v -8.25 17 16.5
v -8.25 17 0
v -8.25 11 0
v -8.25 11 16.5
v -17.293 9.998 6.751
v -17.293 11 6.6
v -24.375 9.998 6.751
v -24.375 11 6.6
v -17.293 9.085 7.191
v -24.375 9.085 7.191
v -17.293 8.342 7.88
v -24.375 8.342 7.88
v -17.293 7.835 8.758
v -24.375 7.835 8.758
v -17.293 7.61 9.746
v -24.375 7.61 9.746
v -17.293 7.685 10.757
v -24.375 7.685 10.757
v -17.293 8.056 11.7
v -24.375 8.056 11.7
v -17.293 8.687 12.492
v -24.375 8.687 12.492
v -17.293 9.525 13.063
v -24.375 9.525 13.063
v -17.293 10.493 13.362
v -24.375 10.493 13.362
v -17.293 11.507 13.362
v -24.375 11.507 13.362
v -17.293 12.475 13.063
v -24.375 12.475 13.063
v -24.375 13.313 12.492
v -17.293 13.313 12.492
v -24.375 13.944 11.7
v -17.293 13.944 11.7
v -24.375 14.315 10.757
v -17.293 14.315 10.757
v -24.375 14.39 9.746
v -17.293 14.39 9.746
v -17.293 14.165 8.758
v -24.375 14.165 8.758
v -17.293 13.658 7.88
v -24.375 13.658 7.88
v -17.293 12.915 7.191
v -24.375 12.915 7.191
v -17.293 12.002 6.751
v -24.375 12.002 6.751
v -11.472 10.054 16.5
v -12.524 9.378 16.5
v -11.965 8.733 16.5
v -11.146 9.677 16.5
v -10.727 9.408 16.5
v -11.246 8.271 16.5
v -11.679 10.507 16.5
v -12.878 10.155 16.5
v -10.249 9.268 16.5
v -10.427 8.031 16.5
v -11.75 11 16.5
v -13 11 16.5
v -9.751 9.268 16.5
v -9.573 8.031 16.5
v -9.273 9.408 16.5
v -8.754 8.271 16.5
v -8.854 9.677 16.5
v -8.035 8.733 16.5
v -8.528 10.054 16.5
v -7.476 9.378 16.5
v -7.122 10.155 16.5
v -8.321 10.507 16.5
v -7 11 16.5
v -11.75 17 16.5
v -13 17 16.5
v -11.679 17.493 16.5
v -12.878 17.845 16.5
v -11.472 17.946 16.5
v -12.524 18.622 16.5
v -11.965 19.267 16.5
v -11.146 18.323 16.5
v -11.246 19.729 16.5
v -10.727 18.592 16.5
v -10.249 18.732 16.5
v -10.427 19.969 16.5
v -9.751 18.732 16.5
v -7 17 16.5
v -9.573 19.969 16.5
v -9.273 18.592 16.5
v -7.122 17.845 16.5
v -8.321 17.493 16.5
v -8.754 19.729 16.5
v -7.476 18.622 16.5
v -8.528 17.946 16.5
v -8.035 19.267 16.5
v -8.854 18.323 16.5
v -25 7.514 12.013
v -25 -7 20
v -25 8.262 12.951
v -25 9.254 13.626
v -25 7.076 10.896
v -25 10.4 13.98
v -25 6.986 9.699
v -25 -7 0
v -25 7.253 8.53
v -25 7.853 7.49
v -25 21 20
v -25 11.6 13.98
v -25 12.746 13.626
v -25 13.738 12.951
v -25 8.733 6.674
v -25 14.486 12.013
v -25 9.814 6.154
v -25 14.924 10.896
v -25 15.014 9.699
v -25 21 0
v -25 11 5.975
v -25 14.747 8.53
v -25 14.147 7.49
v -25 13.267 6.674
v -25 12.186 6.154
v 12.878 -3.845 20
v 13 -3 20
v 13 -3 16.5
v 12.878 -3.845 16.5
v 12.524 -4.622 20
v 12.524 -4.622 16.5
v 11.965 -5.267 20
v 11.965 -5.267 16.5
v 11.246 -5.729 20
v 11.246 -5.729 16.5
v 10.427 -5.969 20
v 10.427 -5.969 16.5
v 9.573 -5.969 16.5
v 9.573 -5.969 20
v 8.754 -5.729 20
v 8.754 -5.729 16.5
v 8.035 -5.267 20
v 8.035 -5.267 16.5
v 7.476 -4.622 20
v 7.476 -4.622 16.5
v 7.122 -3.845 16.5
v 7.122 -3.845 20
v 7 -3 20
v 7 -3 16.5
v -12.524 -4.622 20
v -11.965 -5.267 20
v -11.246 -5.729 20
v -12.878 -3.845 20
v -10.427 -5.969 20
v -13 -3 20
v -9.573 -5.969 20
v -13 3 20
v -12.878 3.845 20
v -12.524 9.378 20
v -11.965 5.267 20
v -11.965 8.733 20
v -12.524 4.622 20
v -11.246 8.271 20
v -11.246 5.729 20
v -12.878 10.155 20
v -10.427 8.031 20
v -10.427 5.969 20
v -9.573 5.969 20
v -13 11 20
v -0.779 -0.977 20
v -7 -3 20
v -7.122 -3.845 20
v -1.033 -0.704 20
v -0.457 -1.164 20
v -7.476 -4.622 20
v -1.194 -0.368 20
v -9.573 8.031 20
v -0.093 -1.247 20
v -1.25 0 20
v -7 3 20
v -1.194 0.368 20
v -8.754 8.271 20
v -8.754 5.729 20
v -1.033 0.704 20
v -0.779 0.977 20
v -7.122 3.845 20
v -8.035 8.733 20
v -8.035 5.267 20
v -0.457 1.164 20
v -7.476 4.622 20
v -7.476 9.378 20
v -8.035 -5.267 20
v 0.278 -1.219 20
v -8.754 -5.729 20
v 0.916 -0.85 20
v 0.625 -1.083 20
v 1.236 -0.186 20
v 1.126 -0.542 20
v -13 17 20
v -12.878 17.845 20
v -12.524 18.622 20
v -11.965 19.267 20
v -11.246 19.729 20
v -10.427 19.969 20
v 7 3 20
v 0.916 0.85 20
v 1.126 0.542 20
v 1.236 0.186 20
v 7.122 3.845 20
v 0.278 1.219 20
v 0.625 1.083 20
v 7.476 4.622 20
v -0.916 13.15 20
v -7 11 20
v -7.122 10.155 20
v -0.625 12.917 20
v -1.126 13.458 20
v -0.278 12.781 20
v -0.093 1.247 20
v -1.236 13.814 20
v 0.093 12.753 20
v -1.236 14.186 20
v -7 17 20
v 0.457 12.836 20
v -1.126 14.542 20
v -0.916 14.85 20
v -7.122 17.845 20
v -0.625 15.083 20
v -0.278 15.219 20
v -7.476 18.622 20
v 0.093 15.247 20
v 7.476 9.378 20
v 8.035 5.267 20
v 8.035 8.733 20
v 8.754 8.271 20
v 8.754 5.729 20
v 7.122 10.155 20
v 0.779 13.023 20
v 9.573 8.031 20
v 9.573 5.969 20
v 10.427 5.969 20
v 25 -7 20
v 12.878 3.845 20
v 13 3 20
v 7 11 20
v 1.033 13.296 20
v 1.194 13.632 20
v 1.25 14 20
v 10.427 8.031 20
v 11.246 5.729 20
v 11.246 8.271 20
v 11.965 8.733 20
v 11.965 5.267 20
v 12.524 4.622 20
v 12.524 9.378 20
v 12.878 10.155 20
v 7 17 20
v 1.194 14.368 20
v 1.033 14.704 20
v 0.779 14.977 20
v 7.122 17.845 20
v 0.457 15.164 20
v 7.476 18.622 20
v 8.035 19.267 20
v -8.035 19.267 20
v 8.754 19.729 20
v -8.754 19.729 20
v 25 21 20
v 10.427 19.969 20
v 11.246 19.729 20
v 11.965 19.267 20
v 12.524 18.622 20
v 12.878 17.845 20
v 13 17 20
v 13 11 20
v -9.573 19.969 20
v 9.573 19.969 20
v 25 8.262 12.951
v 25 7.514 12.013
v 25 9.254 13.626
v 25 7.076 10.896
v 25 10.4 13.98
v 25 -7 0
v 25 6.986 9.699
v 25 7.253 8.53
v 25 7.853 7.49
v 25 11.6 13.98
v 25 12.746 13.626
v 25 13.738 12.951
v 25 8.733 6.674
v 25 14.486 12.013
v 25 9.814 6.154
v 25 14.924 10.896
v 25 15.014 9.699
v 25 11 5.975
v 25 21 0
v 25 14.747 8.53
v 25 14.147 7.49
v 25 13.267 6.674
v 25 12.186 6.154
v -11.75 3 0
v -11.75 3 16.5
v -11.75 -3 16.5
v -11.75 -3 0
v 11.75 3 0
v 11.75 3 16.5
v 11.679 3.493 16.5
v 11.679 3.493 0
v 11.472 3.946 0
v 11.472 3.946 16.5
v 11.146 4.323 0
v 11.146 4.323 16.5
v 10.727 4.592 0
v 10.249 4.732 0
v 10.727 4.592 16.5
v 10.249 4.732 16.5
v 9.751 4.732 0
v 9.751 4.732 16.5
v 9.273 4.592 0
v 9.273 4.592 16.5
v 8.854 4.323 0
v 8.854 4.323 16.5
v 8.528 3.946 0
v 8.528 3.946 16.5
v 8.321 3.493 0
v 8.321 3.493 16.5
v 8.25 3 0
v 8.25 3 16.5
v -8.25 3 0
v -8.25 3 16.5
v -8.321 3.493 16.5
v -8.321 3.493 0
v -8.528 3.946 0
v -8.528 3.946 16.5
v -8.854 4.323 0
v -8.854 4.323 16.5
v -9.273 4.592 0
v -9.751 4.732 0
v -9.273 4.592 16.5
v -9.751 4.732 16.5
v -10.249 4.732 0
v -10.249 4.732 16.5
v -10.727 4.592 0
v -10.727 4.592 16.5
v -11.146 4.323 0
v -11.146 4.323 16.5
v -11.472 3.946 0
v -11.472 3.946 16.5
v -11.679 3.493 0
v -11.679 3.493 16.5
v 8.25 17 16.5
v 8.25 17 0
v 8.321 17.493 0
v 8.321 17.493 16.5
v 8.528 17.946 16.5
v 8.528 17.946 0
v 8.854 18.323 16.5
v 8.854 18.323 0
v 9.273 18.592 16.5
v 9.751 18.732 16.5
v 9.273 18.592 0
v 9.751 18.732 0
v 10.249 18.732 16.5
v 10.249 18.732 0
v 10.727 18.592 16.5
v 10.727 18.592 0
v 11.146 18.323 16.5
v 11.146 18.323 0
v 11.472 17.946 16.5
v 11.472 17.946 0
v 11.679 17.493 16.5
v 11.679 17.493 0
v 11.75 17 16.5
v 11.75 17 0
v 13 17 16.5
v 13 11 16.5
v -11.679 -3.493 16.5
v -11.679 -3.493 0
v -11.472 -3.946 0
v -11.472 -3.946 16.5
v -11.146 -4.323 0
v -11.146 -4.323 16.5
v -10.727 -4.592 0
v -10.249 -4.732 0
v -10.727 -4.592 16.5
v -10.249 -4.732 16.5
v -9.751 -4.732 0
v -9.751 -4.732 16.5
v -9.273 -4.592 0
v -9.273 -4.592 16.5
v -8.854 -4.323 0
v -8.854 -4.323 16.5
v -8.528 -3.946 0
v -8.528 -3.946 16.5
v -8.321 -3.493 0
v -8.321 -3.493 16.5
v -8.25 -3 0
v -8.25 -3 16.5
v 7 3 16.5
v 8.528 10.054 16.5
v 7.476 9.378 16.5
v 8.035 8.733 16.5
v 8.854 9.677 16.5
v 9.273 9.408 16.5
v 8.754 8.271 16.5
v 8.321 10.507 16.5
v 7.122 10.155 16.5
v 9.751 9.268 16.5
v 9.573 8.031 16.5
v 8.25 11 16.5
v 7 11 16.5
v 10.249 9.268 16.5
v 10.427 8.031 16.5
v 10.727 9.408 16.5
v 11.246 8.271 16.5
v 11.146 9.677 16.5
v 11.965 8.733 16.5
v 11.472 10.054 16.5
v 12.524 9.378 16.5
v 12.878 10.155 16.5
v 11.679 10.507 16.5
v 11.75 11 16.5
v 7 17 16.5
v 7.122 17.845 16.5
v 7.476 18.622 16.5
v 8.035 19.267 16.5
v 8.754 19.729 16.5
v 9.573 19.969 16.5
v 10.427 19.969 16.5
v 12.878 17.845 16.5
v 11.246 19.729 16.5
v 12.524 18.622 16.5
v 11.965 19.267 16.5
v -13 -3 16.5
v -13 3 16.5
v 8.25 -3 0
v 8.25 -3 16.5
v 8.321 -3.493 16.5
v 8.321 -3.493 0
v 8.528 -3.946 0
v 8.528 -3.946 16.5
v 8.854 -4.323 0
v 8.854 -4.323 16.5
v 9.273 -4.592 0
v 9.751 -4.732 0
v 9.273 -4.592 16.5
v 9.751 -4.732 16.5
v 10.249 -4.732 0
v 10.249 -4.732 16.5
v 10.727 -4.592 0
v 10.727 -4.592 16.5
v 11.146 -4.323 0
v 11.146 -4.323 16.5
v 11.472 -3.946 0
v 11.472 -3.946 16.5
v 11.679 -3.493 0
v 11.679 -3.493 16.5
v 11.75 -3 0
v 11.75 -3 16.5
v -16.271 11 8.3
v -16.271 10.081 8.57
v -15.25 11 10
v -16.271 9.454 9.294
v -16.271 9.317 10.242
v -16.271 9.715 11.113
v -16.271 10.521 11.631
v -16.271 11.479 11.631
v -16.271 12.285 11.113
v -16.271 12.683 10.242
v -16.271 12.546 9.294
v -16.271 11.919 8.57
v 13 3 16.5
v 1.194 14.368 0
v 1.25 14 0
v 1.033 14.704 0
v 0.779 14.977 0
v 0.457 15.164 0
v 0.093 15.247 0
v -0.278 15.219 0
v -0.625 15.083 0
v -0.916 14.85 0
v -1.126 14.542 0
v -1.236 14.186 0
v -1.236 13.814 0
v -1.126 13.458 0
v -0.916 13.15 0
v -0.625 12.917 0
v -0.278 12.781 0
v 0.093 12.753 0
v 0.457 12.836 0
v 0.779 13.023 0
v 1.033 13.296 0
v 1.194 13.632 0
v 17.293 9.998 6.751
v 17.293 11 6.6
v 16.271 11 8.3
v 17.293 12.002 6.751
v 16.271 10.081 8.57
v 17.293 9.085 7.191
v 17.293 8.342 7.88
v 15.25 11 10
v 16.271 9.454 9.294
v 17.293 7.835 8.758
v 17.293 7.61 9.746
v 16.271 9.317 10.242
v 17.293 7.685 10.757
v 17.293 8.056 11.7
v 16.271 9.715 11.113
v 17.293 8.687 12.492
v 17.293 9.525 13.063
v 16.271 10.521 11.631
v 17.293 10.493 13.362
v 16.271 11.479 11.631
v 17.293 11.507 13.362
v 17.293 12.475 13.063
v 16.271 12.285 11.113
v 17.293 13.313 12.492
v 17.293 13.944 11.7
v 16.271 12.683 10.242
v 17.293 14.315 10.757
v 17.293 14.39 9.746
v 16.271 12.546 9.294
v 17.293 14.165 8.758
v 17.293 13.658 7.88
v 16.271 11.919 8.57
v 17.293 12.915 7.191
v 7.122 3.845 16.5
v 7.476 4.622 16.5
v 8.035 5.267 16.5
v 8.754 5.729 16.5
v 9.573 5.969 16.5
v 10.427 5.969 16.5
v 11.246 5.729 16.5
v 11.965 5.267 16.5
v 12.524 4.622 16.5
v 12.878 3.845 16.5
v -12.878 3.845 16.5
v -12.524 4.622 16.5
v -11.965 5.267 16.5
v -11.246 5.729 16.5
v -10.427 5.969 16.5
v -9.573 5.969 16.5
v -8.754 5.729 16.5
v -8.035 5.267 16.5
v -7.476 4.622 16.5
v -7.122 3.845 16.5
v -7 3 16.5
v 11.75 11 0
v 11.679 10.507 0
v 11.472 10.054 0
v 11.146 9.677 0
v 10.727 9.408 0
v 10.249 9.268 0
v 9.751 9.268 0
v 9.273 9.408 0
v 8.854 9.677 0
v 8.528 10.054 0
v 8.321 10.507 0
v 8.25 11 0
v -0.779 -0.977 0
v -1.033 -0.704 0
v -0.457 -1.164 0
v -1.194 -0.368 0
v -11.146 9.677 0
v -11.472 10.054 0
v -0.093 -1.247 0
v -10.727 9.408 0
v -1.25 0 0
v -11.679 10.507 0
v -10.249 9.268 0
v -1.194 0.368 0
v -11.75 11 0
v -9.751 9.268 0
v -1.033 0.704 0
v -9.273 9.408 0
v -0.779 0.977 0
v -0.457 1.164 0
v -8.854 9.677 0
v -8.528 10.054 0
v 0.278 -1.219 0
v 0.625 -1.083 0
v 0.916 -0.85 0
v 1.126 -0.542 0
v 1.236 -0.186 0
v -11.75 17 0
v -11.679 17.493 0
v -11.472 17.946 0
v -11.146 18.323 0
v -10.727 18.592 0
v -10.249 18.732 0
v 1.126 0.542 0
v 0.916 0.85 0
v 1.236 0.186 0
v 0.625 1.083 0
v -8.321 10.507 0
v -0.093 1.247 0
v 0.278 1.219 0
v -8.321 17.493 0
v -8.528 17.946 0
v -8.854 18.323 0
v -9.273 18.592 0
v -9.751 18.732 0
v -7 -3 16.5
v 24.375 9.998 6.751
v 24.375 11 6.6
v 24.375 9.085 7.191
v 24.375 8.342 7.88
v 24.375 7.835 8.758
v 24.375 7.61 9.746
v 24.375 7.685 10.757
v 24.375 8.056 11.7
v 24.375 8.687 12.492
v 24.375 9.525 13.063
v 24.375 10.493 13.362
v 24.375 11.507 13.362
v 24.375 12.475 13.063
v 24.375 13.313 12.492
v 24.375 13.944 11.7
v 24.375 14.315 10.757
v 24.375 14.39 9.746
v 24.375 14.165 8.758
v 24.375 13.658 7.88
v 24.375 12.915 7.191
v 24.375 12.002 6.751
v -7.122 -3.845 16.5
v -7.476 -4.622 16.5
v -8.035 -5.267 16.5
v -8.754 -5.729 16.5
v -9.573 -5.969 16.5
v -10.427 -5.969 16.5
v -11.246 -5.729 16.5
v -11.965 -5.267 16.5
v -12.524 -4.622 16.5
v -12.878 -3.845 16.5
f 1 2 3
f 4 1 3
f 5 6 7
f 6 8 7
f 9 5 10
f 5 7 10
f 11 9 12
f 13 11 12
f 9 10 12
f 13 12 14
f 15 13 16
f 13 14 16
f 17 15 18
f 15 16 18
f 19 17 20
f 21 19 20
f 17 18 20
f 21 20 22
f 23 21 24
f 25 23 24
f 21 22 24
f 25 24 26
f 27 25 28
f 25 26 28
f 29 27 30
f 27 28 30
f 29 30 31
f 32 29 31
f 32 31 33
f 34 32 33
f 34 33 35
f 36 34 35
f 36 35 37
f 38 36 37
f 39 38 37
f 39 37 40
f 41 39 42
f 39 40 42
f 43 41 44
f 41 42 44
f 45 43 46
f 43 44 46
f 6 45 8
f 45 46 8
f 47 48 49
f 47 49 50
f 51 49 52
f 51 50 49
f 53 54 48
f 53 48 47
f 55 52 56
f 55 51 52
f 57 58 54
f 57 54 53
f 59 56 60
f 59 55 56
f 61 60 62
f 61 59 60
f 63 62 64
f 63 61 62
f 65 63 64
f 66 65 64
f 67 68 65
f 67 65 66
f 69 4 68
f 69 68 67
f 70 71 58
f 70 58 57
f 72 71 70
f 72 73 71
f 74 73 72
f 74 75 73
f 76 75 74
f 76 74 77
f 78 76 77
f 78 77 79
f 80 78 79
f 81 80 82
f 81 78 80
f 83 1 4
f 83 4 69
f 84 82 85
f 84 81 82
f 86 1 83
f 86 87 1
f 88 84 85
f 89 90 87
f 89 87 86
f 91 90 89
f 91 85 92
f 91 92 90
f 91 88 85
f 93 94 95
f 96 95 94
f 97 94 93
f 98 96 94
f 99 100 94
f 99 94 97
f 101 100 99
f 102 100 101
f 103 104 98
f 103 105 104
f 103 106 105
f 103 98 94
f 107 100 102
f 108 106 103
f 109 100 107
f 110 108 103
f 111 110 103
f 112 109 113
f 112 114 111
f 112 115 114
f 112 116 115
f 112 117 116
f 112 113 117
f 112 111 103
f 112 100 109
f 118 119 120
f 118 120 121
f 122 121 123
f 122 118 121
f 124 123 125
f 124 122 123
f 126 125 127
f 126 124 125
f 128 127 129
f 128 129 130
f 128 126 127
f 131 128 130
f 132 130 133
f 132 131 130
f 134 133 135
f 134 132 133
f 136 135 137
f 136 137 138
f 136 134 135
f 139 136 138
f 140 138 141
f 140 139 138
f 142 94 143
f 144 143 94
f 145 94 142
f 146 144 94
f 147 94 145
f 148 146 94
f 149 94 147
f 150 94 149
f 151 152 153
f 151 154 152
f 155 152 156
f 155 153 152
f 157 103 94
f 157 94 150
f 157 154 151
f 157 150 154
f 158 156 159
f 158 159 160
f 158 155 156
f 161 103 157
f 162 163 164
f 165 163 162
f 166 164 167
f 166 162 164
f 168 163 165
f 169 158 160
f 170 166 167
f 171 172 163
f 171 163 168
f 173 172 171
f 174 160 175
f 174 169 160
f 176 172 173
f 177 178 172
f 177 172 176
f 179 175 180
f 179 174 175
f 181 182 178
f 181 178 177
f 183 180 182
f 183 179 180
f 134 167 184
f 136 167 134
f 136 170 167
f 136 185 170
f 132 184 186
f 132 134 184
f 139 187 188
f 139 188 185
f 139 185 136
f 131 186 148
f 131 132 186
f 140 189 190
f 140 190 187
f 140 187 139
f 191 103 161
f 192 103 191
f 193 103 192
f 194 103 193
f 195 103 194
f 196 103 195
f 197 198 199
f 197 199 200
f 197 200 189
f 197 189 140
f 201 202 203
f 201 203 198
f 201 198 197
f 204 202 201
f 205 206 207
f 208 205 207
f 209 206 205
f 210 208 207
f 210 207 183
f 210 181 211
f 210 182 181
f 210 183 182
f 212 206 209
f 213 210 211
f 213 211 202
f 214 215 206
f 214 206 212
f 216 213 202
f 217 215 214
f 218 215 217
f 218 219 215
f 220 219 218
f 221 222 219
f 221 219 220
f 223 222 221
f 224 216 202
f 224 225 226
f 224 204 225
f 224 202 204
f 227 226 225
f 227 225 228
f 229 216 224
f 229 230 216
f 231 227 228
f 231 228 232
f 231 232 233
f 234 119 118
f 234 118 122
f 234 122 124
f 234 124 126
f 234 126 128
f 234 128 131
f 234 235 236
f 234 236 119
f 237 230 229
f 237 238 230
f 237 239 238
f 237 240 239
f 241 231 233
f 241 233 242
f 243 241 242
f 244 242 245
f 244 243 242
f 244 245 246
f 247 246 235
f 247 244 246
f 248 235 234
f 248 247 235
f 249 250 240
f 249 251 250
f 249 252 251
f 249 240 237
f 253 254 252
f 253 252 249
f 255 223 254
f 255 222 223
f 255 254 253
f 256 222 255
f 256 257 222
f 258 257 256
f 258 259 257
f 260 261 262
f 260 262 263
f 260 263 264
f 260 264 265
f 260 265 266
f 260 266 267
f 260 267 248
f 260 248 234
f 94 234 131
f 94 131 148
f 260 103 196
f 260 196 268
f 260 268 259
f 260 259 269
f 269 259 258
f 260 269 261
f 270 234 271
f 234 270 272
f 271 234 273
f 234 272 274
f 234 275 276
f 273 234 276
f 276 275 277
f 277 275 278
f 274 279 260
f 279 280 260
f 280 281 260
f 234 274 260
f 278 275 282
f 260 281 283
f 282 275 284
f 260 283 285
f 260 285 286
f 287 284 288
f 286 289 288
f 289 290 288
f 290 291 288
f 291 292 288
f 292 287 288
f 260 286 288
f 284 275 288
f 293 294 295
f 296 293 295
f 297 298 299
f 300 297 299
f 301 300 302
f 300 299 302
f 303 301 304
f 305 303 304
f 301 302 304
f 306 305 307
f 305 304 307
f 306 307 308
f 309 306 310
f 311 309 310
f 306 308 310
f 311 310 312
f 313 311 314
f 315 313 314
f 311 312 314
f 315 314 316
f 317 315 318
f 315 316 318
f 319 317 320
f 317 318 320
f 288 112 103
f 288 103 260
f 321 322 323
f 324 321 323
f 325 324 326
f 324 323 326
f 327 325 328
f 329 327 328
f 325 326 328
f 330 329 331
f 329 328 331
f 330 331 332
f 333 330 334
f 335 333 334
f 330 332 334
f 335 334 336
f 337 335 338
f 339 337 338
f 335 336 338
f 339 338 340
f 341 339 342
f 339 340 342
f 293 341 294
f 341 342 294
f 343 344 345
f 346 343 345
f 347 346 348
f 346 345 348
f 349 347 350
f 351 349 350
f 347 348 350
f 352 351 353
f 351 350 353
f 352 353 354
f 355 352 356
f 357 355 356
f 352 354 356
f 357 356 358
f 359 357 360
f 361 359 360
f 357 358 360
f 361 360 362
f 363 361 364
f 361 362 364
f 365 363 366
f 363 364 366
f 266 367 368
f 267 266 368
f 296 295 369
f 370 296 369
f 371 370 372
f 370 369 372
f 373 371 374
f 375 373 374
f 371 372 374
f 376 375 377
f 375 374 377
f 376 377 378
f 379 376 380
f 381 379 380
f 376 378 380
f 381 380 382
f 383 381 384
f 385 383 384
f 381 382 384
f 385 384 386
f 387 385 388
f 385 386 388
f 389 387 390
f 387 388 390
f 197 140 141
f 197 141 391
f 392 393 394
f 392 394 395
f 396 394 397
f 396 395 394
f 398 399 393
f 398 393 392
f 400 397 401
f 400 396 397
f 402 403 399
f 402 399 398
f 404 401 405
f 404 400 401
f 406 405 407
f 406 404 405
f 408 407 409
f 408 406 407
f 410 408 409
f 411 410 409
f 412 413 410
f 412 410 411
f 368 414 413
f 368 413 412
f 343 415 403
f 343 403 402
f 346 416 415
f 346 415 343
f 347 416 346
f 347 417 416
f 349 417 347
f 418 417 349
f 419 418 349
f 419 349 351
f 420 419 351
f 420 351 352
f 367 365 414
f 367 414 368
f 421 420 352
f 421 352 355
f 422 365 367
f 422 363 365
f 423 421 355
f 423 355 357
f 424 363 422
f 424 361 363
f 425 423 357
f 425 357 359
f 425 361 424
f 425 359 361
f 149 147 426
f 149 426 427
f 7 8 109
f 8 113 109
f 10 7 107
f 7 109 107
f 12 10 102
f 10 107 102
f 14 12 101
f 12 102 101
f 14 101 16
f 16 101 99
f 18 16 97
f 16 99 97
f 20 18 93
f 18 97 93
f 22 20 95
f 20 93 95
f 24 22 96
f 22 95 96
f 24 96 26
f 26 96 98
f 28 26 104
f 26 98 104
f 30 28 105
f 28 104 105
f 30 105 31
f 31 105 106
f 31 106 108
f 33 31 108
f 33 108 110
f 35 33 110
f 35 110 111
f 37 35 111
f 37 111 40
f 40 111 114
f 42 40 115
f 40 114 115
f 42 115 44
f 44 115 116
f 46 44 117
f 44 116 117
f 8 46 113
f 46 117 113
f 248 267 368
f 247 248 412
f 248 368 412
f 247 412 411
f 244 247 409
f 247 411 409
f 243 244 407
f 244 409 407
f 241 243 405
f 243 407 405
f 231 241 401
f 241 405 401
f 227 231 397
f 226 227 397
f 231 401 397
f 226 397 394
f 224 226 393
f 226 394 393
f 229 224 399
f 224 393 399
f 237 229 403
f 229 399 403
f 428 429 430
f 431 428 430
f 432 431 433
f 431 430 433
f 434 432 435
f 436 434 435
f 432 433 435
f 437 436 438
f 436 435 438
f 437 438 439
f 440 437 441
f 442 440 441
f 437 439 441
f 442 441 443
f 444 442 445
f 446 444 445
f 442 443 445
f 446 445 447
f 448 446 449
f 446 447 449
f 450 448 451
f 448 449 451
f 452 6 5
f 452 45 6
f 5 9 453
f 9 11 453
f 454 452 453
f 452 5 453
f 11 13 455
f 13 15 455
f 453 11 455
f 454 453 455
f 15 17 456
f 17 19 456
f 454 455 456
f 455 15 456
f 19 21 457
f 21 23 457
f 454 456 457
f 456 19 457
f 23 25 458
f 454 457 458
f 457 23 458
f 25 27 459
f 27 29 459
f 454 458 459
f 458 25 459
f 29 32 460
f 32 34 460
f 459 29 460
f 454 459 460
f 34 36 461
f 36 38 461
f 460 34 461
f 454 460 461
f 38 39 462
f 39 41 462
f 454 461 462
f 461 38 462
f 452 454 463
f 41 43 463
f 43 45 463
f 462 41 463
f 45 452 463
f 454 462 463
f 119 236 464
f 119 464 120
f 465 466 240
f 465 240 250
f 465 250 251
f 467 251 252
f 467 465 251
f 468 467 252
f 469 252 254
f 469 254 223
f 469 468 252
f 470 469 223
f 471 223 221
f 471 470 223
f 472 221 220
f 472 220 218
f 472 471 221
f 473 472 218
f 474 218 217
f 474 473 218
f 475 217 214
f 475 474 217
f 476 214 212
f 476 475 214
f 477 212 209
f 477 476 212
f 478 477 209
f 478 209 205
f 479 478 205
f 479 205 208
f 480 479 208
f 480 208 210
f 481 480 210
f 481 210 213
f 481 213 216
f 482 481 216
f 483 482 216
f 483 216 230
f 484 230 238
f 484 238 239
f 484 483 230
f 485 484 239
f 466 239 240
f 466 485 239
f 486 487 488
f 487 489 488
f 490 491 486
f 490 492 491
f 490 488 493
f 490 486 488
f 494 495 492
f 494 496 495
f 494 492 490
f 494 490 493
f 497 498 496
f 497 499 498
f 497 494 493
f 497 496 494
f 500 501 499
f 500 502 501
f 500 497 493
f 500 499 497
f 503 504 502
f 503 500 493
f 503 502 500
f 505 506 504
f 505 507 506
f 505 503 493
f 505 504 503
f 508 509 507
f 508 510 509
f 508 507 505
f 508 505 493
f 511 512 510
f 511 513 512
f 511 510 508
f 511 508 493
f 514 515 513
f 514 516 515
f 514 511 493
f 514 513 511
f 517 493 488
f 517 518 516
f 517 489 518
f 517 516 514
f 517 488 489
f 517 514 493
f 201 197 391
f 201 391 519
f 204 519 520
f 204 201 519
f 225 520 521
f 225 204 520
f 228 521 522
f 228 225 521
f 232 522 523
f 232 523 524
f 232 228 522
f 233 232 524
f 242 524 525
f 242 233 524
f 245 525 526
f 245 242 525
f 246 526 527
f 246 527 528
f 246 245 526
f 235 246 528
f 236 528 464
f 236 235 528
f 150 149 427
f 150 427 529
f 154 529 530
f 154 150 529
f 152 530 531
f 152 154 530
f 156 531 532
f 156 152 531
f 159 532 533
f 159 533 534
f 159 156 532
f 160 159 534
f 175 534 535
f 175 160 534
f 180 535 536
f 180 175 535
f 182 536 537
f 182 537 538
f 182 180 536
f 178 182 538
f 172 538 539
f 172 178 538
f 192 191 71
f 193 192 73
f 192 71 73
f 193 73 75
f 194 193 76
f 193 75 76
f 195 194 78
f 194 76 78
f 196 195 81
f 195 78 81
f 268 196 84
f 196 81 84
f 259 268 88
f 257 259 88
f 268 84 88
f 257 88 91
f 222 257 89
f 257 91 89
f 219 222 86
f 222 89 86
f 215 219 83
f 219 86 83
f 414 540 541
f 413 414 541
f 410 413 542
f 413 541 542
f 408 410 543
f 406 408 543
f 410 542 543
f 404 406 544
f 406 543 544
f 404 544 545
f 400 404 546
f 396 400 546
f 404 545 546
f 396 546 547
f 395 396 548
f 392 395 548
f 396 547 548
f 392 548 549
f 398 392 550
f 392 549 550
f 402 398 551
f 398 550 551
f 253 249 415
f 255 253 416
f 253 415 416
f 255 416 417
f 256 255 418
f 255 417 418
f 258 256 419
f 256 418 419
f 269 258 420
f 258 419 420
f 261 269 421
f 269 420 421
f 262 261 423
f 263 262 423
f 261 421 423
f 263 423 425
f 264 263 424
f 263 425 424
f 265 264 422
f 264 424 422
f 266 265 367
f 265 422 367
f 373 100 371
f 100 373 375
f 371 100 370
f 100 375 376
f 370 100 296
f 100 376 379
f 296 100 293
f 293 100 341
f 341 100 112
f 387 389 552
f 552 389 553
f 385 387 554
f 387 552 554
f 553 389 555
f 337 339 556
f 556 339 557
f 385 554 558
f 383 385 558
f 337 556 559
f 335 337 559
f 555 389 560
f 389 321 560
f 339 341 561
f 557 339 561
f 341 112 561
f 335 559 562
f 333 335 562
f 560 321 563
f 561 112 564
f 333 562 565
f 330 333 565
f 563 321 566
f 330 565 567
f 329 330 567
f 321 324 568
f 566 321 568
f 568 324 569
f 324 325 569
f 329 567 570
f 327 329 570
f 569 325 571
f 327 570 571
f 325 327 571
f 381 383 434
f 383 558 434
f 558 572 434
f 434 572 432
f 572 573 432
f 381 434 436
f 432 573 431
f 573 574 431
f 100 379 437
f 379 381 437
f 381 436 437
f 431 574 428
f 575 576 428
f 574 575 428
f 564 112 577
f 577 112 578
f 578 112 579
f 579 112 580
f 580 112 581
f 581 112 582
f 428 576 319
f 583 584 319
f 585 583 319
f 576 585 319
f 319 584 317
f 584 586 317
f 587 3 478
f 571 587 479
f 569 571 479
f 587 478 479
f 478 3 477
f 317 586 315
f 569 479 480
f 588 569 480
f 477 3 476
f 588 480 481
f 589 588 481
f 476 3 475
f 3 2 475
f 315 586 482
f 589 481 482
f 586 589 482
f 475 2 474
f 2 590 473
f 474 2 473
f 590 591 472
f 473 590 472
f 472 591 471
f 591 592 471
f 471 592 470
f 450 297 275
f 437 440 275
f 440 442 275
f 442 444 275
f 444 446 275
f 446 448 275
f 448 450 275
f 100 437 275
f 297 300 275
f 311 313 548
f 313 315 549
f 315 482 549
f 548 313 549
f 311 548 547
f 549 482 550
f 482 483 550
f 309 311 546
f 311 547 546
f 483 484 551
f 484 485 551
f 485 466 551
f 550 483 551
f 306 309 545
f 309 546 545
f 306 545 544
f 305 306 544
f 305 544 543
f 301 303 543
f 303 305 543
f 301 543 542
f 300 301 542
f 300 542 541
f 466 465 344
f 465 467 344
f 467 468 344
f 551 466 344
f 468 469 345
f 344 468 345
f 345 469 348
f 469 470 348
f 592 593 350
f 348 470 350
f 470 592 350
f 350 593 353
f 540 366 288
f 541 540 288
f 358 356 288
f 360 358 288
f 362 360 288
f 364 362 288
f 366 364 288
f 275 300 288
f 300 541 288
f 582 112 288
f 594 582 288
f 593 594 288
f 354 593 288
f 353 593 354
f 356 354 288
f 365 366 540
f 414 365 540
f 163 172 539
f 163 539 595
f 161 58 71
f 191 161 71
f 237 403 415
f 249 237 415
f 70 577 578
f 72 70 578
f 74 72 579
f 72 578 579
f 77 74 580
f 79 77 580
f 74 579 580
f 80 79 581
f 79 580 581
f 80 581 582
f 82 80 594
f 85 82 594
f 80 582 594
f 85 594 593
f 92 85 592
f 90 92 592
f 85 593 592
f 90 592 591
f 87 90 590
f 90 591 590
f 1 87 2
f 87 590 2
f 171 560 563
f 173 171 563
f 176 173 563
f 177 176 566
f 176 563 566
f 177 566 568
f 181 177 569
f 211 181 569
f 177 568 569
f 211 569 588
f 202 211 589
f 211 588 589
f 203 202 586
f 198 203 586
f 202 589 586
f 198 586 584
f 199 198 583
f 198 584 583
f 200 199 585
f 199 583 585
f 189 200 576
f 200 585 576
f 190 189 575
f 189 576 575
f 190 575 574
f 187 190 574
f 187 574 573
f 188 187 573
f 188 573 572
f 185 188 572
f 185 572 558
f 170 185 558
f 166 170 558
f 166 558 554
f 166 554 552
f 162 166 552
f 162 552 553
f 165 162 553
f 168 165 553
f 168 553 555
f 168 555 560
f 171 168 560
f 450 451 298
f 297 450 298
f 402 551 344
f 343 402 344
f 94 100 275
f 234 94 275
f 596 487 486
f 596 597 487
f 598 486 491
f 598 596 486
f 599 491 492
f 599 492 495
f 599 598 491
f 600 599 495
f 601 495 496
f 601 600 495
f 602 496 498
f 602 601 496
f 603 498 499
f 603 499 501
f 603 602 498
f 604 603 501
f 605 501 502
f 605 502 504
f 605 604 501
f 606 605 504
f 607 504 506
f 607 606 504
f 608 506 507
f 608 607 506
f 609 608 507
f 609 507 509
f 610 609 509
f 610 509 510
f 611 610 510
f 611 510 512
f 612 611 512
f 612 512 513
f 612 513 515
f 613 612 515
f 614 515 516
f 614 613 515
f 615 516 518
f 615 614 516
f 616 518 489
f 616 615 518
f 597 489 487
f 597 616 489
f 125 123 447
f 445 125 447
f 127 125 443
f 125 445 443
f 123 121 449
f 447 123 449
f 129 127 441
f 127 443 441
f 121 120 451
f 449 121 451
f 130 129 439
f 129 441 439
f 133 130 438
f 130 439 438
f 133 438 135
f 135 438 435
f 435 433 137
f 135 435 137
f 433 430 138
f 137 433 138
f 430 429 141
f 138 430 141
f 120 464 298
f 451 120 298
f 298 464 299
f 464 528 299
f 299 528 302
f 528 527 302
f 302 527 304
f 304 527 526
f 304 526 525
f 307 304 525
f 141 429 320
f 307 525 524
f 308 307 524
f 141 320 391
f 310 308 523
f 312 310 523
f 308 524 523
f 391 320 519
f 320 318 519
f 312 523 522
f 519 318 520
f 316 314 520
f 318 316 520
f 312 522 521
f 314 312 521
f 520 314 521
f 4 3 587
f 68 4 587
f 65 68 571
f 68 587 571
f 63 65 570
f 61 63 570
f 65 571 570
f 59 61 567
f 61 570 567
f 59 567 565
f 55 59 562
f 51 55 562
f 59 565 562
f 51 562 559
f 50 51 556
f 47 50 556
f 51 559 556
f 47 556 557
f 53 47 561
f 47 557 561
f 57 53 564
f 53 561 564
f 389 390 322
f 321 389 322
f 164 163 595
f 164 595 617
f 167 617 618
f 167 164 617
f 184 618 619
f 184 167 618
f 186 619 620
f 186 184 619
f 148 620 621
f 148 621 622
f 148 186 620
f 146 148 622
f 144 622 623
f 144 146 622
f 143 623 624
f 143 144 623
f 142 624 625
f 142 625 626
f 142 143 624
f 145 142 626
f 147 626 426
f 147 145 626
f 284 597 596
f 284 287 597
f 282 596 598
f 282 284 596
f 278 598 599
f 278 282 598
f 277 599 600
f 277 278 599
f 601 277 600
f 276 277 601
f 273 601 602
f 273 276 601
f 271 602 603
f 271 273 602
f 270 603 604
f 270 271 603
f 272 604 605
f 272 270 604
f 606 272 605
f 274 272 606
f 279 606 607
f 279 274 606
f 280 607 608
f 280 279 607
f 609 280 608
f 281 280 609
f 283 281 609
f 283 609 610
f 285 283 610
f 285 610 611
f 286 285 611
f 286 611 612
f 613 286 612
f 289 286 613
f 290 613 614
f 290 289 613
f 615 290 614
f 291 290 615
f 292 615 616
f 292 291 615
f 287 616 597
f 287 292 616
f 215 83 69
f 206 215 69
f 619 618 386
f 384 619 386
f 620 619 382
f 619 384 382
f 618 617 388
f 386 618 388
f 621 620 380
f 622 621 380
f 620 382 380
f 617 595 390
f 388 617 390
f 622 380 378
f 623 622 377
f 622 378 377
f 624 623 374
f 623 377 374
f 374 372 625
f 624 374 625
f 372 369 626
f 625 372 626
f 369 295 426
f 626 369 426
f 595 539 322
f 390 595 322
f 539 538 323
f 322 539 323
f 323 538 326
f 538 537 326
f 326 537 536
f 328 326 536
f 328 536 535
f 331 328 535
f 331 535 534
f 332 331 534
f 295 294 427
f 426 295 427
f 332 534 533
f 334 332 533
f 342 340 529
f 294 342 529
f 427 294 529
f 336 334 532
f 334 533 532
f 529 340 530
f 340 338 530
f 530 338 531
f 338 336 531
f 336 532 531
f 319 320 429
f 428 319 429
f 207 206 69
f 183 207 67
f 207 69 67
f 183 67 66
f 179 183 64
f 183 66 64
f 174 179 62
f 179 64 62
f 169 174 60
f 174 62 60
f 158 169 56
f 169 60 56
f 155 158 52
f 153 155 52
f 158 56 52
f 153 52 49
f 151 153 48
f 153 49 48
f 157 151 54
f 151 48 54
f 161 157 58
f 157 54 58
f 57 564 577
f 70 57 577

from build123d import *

# Parameters (mm, degrees)
SKETCH1_W             = 50
SKETCH1_H             = 14
BOSS_EXTRUDE1_DEPTH   = 20
CUT_EXTRUDE1_DEPTH    = 3.5
CUT_EXTRUDE2_DEPTH    = 31.761176831
M3X0_5_TAPPED_HOLE1_D = 2.5
MIRROR1_OUTLINE_W     = 50
MIRROR1_OUTLINE_H     = 14
MIRROR1_OUTLINE_R     = 1.25
MIRROR1_DEPTH         = 20
MIRROR1_2_DEPTH       = 16.5


# Read off the part's stored shape, not the designer's step: Mirror1
with BuildPart() as part:
    # Sketch1 → Boss-Extrude1 (new body)
    with BuildSketch(Plane.XY):
        Rectangle(SKETCH1_W, SKETCH1_H)
    extrude(amount=BOSS_EXTRUDE1_DEPTH)

    # Sketch2 → Cut-Extrude1 (cut)
    with BuildSketch(Plane.XY.offset(20)):
        with BuildLine():
            Line((-7, 3), (-7, -3))
            ThreePointArc((-7, -3), (-10, -6), (-13, -3))
            Line((-13, -3), (-13, 3))
            ThreePointArc((-13, 3), (-10, 6), (-7, 3))
        make_face()
        with BuildLine():
            Line((13, 3), (13, -3))
            ThreePointArc((13, -3), (10, -6), (7, -3))
            Line((7, -3), (7, 3))
            ThreePointArc((7, 3), (10, 6), (13, 3))
        make_face()
    extrude(amount=-CUT_EXTRUDE1_DEPTH, mode=Mode.SUBTRACT)

    # Sketch3 → Cut-Extrude2 (cut, through all)
    with BuildSketch(Plane.XY.offset(16.5)):
        with BuildLine():
            Line((-11.75, 3), (-11.75, -3))
            ThreePointArc((-11.75, -3), (-10, -4.75), (-8.25, -3))
            Line((-8.25, -3), (-8.25, 3))
            ThreePointArc((-8.25, 3), (-10, 4.75), (-11.75, 3))
        make_face()
        with BuildLine():
            Line((11.75, -3), (11.75, 3))
            ThreePointArc((11.75, 3), (10, 4.75), (8.25, 3))
            Line((8.25, 3), (8.25, -3))
            ThreePointArc((8.25, -3), (10, -4.75), (11.75, -3))
        make_face()
    extrude(amount=-CUT_EXTRUDE2_DEPTH, mode=Mode.SUBTRACT)

    # M3x0.5 Tapped Hole1 (through all)
    with Locations(Plane.XY.offset(20)):
        with Locations((0, 0)):
            Hole(M3X0_5_TAPPED_HOLE1_D / 2)

    # Mirror1 outline → Mirror1 (add)
    with BuildSketch(Plane.XY):
        with Locations((0, 14)):
            Rectangle(MIRROR1_OUTLINE_W, MIRROR1_OUTLINE_H)
        with BuildLine():
            ThreePointArc((-13, 17), (-10, 20), (-7, 17))
            Line((-7, 17), (-7, 11))
            ThreePointArc((-7, 11), (-10, 8), (-13, 11))
            Line((-13, 11), (-13, 17))
        make_face(mode=Mode.SUBTRACT)
        with Locations((0, 14)):
            Circle(MIRROR1_OUTLINE_R, mode=Mode.SUBTRACT)
        with BuildLine():
            ThreePointArc((7, 17), (10, 20), (13, 17))
            Line((13, 17), (13, 11))
            ThreePointArc((13, 11), (10, 8), (7, 11))
            Line((7, 11), (7, 17))
        make_face(mode=Mode.SUBTRACT)
    extrude(amount=MIRROR1_DEPTH)

    # Mirror1 2 outline → Mirror1 2 (add)
    # profile 1 of 2: a face of its own
    with BuildSketch(Plane.XY):
        with BuildLine():
            Line((13, 11), (13, 17))
            ThreePointArc((13, 17), (10, 20), (7, 17))
            Line((7, 17), (7, 11))
            ThreePointArc((7, 11), (10, 8), (13, 11))
        make_face()
        with BuildLine():
            ThreePointArc((11.75, 11), (10, 9.25), (8.25, 11))
            Line((8.25, 11), (8.25, 17))
            ThreePointArc((8.25, 17), (10, 18.75), (11.75, 17))
            Line((11.75, 17), (11.75, 11))
        make_face(mode=Mode.SUBTRACT)
    # profile 2 of 2: a face of its own
    with BuildSketch(Plane.XY):
        with BuildLine():
            Line((-7, 11), (-7, 17))
            ThreePointArc((-7, 17), (-10, 20), (-13, 17))
            Line((-13, 17), (-13, 11))
            ThreePointArc((-13, 11), (-10, 8), (-7, 11))
        make_face()
        with BuildLine():
            ThreePointArc((-11.75, 17), (-10, 18.75), (-8.25, 17))
            Line((-8.25, 17), (-8.25, 11))
            ThreePointArc((-8.25, 11), (-10, 9.25), (-11.75, 11))
            Line((-11.75, 11), (-11.75, 17))
        make_face(mode=Mode.SUBTRACT)
    extrude(amount=MIRROR1_2_DEPTH)

    # Sketch10 → M8x1.25 Tapped Hole1 (revolve, cut)
    with BuildSketch(Plane(origin=(25, 11, 10), x_dir=(0, 0, -1), z_dir=(0, 1, 0))):
        Polygon((0, 0), (0, 9.75), (3.4, 7.707073895), (3.4, 0.625), (4.025, 0), align=None)
    m8x1_25_tapped_hole1 = revolve(axis=Axis((31.35, 11, 10), (-1, 0, 0)), mode=Mode.SUBTRACT)

    # Mirror2: M8x1.25 Tapped Hole1 across plane
    add(m8x1_25_tapped_hole1.mirror(Plane(origin=(0, 0, 0), x_dir=(0, 0, 1), z_dir=(1, 0, 0))), mode=Mode.SUBTRACT)


solid = part.part
